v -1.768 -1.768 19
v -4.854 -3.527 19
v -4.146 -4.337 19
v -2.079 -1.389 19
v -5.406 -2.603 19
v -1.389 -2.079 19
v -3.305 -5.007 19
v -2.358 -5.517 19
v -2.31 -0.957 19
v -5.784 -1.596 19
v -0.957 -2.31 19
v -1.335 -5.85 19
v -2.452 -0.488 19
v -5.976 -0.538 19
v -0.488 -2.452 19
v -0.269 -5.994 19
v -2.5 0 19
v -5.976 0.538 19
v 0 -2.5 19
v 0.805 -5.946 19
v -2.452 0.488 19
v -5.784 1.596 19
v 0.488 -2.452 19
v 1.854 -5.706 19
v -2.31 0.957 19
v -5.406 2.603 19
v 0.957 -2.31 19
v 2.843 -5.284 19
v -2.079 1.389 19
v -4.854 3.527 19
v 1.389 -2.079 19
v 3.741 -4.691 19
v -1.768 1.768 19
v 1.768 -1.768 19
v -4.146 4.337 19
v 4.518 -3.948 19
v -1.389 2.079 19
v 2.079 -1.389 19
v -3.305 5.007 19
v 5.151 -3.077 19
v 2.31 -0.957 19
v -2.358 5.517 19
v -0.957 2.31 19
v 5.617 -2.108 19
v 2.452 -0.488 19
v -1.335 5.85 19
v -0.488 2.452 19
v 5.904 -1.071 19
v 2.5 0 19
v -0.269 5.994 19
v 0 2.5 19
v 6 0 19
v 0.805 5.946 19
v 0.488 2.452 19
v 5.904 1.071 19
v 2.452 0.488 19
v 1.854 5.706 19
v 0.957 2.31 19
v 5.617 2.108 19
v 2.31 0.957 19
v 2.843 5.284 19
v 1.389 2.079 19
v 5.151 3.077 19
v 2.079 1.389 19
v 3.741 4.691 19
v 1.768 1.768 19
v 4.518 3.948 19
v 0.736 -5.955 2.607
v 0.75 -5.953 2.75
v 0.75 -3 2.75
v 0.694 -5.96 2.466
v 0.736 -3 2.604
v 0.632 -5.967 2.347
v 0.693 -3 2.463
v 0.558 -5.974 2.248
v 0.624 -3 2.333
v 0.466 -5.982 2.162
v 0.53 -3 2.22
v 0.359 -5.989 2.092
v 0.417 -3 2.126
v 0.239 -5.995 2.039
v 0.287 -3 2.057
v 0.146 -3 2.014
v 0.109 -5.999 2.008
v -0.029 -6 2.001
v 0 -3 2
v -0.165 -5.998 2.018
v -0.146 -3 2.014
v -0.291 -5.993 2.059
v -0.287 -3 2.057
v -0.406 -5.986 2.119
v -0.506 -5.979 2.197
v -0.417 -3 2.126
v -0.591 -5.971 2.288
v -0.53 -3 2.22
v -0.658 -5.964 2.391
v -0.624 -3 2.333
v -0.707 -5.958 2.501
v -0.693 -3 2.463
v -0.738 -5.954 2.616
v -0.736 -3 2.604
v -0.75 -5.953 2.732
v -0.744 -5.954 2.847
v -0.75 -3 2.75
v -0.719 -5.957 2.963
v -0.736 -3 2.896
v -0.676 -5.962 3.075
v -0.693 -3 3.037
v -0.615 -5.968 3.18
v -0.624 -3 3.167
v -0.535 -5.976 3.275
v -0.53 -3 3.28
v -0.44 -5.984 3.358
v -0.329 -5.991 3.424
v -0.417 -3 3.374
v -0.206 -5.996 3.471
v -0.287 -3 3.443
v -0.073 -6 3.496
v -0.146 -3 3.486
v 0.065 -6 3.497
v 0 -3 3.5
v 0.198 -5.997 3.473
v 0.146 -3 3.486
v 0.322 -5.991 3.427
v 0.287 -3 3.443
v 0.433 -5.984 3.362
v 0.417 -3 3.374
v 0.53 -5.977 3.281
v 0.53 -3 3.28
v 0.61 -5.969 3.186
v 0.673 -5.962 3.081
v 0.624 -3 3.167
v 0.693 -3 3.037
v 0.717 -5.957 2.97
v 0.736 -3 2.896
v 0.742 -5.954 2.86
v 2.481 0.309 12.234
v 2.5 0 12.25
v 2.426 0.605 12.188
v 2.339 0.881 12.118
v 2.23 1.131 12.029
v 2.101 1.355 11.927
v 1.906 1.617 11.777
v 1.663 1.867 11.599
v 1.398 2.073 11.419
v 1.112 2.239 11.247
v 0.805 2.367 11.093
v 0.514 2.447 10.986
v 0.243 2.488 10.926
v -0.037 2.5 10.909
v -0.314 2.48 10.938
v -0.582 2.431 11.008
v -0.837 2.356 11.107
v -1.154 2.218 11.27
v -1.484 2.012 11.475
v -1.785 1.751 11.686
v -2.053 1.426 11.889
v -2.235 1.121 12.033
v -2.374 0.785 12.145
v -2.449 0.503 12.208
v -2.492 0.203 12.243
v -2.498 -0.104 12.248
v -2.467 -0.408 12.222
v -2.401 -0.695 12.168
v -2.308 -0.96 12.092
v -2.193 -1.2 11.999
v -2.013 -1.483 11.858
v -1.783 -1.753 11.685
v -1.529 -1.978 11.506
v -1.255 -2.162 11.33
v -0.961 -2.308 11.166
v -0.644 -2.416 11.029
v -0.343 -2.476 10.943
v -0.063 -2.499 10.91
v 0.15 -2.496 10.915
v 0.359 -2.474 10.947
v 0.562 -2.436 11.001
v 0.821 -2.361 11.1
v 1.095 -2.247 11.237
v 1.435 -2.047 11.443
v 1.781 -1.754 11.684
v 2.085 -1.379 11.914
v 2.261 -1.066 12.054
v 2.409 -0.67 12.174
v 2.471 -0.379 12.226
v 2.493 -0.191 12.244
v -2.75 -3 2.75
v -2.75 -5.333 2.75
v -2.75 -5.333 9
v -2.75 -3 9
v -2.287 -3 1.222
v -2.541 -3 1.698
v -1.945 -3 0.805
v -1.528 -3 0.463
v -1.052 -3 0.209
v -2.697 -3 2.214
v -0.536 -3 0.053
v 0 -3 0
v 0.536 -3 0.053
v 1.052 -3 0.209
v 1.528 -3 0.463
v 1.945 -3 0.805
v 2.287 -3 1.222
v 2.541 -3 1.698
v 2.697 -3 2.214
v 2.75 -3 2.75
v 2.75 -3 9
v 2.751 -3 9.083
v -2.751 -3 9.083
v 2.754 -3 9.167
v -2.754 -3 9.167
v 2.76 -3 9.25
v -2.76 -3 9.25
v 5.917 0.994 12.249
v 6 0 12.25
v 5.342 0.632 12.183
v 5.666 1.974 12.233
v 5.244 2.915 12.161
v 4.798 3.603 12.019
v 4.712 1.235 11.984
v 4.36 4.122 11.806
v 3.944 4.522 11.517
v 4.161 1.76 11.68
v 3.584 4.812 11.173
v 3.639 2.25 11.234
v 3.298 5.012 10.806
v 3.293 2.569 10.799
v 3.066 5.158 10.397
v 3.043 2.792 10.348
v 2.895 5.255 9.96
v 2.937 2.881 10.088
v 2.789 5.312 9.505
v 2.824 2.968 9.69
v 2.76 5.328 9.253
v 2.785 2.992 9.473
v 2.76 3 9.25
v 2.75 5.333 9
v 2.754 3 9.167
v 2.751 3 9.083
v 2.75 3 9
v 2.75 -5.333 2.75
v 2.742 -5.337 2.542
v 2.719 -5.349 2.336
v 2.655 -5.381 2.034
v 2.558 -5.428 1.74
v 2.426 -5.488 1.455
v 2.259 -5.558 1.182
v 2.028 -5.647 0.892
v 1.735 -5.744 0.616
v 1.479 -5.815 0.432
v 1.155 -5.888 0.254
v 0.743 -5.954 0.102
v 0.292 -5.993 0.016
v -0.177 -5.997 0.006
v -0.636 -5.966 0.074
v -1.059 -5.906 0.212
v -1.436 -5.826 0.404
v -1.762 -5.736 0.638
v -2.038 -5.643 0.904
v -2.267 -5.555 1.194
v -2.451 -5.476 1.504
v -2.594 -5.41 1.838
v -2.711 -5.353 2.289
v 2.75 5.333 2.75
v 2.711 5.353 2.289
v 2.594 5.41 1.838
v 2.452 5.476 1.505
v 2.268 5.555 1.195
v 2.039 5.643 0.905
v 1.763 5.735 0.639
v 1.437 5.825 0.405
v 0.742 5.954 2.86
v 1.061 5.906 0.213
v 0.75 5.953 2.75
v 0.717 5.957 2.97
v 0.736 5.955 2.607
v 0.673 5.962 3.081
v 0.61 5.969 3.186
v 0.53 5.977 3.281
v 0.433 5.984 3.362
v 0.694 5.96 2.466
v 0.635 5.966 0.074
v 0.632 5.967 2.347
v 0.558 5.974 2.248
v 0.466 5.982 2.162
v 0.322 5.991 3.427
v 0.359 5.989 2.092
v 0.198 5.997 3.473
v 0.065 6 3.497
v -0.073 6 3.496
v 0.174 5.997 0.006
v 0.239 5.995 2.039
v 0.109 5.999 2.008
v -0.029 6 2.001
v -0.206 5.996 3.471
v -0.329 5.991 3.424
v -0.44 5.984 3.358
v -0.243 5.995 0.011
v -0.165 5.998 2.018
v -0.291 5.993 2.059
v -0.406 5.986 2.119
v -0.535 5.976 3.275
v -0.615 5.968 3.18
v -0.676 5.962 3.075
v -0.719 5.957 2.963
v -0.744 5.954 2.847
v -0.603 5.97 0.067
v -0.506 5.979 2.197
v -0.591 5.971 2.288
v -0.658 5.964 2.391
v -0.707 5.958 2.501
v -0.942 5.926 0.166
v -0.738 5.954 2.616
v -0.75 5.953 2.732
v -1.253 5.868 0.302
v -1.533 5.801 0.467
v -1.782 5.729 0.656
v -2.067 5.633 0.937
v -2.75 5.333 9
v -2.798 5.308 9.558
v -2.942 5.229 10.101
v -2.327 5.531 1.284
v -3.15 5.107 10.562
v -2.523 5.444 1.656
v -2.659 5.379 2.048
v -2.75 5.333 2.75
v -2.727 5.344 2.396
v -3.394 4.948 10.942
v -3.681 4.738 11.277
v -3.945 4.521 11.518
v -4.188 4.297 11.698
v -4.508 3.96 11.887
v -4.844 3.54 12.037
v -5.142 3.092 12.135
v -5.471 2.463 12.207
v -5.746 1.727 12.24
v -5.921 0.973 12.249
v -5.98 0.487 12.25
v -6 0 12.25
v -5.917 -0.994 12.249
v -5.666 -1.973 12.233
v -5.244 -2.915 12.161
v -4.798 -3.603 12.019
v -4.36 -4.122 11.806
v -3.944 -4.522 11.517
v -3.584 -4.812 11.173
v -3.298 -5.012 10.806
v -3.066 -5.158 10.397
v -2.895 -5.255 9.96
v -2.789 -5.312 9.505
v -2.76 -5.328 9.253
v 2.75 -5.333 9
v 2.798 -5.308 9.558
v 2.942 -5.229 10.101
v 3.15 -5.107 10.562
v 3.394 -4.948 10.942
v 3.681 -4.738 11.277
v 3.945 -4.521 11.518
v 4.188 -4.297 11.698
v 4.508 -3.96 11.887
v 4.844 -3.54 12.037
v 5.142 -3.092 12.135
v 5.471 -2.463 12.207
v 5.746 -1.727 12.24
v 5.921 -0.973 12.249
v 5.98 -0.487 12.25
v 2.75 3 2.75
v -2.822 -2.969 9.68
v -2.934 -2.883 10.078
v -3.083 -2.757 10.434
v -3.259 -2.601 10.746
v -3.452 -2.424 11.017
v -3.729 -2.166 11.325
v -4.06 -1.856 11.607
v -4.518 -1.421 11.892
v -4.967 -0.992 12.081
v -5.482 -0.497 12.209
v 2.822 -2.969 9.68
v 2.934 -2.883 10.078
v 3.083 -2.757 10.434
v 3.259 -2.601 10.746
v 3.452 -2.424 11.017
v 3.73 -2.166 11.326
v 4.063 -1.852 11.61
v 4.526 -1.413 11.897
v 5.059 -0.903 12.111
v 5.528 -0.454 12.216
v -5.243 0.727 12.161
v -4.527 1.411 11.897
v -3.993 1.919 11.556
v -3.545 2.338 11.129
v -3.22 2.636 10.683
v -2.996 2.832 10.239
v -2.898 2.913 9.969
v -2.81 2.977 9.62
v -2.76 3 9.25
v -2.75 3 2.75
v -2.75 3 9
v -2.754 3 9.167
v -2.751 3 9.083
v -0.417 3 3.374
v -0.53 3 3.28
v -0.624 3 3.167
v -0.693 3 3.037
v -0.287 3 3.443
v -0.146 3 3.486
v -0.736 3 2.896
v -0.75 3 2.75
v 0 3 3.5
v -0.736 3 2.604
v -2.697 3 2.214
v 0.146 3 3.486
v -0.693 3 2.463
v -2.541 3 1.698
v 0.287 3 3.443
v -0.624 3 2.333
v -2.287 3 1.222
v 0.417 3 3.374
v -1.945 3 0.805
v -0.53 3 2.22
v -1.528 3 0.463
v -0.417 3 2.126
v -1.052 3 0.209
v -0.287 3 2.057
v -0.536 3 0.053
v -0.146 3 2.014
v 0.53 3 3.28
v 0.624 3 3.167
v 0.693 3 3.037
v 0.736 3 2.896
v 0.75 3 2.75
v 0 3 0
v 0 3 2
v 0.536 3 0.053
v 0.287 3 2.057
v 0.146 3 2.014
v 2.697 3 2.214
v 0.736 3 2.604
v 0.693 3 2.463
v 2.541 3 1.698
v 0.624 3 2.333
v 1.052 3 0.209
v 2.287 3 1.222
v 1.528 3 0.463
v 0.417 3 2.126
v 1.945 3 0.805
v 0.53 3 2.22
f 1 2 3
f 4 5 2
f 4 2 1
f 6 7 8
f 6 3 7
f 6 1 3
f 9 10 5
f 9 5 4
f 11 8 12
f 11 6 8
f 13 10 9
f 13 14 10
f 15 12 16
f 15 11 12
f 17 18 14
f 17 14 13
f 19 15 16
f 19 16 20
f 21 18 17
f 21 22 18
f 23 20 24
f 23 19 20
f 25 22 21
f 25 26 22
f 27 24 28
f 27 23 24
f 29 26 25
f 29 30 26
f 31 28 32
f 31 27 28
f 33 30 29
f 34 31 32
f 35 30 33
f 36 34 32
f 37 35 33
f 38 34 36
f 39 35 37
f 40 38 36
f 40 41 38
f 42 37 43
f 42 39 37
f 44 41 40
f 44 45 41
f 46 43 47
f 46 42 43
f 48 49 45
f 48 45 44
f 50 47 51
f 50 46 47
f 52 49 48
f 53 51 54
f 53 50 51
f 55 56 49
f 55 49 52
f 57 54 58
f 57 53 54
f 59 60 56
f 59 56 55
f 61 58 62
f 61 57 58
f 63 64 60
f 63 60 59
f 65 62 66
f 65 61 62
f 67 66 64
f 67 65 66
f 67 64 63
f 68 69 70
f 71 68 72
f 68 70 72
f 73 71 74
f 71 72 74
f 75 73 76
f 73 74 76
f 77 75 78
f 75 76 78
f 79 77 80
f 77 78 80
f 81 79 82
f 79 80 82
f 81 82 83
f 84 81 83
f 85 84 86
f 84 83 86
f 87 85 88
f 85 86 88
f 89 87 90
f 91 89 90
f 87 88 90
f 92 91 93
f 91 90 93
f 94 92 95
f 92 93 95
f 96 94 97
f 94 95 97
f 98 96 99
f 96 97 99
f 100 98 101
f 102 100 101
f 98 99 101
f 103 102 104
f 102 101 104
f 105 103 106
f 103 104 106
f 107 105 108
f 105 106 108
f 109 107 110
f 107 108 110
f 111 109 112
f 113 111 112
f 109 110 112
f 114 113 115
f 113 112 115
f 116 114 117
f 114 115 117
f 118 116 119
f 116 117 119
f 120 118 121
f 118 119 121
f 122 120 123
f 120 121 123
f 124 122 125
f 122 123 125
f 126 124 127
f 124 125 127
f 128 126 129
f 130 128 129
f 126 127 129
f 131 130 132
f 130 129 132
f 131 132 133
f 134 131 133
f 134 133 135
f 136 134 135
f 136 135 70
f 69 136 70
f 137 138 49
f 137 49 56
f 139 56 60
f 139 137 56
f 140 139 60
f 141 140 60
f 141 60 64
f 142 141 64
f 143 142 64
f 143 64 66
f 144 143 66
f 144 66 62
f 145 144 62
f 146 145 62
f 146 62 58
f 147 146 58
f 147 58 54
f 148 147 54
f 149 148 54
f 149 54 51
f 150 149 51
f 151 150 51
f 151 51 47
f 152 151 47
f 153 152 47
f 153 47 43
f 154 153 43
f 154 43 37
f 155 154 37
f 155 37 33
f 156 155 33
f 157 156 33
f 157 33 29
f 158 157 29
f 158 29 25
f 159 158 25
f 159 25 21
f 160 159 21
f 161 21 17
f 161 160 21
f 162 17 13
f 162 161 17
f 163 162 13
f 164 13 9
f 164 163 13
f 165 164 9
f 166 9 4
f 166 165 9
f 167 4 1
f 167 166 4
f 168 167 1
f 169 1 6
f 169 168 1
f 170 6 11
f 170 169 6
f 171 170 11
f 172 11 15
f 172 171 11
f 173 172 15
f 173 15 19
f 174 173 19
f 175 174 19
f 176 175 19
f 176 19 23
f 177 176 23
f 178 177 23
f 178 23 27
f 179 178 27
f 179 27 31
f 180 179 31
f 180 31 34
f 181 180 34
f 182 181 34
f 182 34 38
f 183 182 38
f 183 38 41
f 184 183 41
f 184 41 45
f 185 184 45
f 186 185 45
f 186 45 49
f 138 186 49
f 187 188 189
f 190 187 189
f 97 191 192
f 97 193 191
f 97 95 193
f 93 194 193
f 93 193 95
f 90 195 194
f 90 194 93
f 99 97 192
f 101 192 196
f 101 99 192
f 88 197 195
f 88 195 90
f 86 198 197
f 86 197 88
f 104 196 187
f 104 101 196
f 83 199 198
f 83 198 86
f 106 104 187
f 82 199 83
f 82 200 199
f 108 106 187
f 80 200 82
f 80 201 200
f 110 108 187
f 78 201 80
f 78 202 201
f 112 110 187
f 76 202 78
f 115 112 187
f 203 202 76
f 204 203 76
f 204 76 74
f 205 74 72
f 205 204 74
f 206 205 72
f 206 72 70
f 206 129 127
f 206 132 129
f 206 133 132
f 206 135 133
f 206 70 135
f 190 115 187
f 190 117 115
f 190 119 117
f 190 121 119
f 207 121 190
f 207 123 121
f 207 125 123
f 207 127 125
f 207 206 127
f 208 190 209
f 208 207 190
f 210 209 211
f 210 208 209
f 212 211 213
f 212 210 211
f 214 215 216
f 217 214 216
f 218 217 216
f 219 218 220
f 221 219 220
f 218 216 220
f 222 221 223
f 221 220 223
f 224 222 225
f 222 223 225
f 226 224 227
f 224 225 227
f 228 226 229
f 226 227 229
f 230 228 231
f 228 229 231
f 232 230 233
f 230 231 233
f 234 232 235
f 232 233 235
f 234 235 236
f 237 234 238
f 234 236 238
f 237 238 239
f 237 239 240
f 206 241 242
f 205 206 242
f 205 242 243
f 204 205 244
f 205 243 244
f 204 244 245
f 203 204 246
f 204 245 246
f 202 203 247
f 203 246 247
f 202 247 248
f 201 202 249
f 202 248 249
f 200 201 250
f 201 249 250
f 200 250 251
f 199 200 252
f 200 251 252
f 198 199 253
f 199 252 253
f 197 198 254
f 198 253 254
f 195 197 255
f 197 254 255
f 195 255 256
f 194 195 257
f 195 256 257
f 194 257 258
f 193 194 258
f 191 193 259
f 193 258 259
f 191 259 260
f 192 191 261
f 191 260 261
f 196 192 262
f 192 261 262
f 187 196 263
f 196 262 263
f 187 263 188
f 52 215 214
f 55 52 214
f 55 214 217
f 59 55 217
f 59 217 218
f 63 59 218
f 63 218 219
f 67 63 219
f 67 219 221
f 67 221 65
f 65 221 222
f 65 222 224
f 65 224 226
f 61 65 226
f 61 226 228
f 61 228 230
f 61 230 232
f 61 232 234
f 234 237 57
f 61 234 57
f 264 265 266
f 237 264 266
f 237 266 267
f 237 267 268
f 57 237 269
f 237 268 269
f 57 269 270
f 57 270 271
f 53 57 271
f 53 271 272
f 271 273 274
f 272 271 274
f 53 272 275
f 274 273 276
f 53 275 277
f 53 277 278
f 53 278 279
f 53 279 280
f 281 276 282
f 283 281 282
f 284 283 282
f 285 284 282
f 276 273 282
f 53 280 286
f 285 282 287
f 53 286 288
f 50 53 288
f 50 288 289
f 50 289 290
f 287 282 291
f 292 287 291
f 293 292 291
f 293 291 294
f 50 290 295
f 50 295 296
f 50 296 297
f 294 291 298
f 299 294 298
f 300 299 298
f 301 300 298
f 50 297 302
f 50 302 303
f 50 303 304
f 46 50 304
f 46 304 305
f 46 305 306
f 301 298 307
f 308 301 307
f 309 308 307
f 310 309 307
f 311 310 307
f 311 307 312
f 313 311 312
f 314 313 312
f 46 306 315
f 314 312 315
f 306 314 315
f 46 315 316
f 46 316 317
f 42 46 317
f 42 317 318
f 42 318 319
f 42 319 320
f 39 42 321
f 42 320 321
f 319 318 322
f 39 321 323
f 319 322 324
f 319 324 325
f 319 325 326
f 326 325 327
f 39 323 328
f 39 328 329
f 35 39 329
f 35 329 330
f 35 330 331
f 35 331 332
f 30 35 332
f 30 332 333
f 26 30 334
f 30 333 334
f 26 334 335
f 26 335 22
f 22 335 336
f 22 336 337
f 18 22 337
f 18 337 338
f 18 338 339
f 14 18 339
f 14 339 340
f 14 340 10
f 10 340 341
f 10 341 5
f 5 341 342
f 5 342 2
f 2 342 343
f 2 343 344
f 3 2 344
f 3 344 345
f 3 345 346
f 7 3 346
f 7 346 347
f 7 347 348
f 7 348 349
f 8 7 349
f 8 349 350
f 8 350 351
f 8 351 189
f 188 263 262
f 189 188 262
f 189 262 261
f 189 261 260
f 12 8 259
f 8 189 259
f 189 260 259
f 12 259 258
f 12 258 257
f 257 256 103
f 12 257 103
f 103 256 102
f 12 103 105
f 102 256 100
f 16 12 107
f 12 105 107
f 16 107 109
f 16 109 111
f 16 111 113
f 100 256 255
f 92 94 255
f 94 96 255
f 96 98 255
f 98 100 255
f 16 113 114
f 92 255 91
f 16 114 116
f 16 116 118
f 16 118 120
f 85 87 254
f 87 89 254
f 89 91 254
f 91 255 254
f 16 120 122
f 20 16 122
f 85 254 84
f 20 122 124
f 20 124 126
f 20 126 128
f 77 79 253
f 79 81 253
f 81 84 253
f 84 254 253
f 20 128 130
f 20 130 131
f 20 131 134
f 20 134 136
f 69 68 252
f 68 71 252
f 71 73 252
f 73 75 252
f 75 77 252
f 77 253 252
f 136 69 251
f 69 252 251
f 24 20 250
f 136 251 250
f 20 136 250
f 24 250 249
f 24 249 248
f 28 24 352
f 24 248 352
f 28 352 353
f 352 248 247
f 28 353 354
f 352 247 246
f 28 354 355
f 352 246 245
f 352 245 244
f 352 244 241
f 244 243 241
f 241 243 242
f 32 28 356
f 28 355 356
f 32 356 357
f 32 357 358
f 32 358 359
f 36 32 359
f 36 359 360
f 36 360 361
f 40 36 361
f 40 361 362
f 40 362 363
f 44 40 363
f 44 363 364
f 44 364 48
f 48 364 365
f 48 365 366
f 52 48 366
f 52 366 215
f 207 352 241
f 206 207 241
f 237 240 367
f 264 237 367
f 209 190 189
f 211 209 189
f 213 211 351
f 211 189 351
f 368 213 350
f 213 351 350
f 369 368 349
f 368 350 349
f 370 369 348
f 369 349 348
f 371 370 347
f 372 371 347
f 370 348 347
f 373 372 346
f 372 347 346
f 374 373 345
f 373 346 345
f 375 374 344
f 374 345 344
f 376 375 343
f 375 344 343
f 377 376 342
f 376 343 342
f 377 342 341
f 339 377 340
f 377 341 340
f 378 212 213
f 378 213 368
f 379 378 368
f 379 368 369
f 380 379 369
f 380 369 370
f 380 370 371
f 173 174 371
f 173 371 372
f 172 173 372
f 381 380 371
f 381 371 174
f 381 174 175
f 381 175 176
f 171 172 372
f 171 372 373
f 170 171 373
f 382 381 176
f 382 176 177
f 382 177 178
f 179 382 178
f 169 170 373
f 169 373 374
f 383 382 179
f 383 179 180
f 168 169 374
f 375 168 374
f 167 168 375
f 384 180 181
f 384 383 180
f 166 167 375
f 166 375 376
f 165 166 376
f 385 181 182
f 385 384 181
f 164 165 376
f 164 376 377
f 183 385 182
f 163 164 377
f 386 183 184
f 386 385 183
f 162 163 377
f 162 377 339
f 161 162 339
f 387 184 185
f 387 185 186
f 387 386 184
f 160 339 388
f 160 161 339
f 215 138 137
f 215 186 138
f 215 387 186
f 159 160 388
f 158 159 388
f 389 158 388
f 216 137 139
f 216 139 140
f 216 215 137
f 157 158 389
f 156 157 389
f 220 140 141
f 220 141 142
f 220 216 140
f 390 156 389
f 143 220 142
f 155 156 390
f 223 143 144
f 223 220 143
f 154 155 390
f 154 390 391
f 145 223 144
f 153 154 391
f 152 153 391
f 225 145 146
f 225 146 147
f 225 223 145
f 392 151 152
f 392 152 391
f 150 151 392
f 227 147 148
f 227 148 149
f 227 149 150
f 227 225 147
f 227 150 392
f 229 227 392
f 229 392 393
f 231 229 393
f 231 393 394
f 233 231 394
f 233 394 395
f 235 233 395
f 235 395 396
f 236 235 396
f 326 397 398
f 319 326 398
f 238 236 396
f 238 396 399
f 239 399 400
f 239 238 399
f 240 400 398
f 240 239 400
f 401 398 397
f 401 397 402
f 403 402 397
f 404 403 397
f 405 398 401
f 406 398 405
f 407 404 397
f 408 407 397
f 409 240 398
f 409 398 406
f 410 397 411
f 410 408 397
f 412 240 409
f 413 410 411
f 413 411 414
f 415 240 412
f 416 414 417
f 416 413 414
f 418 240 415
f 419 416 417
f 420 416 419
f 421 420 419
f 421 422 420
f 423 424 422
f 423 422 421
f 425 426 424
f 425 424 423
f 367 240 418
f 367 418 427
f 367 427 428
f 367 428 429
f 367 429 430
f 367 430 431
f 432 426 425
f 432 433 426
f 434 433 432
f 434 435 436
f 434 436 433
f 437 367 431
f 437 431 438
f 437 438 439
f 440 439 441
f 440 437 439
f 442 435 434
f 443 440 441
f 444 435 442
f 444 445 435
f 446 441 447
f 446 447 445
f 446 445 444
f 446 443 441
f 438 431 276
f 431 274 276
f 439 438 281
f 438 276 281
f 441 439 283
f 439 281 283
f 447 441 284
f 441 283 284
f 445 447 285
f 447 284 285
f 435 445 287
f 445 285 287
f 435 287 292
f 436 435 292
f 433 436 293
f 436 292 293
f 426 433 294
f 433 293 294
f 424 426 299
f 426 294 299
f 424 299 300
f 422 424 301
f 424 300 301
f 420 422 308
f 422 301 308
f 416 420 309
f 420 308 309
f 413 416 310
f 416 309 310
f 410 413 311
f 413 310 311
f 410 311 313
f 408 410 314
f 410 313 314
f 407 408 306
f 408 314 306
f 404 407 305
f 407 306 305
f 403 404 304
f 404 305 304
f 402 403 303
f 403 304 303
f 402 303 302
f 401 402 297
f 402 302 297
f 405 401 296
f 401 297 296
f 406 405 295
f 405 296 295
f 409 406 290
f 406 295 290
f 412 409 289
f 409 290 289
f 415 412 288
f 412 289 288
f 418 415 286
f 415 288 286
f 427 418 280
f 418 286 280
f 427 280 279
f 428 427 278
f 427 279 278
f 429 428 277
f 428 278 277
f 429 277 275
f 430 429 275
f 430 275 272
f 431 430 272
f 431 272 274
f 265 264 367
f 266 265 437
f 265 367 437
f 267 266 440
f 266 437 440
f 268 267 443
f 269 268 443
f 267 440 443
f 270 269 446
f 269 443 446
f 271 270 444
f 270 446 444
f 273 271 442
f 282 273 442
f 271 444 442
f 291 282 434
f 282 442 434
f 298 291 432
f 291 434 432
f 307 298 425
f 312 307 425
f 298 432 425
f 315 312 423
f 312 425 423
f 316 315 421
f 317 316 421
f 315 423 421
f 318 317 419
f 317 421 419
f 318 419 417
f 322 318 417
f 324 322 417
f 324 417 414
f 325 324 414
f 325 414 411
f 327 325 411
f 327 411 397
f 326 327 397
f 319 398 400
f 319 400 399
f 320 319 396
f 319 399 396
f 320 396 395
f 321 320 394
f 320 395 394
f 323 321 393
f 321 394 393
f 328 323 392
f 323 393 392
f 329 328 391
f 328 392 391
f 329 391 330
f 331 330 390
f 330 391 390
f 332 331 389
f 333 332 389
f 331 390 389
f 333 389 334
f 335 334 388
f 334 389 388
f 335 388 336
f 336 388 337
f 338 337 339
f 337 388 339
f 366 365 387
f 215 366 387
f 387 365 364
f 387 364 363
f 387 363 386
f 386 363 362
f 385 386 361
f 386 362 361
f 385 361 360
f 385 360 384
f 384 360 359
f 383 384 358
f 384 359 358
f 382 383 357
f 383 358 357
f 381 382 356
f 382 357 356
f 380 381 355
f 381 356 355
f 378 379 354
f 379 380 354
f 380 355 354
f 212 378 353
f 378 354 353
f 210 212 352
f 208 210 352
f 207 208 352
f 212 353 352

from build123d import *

# Parameters (mm, degrees)
SKETCH_1_R          = 6
SKETCH_1_R_2        = 2.5
EXTRUDE_1_DEPTH     = 19
SKETCH_2_OUTSIDE_W  = 19.096
SKETCH_2_OUTSIDE_H  = 26.096
SKETCH_2_OUTSIDE_R  = 0.75
CUT_EXTRUDE_1_DEPTH = 9.5
CUT_EXTRUDE_2_DEPTH = 9.5


with BuildPart() as part:
    # 草图1 → 凸台-拉伸1 (new body)
    with BuildSketch(Plane.XY):
        Circle(SKETCH_1_R)
        Circle(SKETCH_1_R_2, mode=Mode.SUBTRACT)
    extrude(amount=EXTRUDE_1_DEPTH)

    # 草图2 outside → 切除-拉伸1 (cut, symmetric)
    with BuildSketch(Plane(origin=(0, 0, 0), x_dir=(1, 0, 0), z_dir=(0, 1, 0))):
        with Locations((0, -9.5)):
            Rectangle(SKETCH_2_OUTSIDE_W, SKETCH_2_OUTSIDE_H)
        with BuildLine():
            Line((-2.75, -2.75), (-2.75, -9))
            ThreePointArc((-2.75, -9), (-3.701902961, -11.298097039), (-6, -12.25))
            Line((-6, -12.25), (-6, -19))
            Line((-6, -19), (6, -19))
            Line((6, -19), (6, -12.25))
            ThreePointArc((6, -12.25), (3.701902961, -11.298097039), (2.75, -9))
            Line((2.75, -9), (2.75, -2.75))
            ThreePointArc((2.75, -2.75), (0, 0), (-2.75, -2.75))
        make_face(mode=Mode.SUBTRACT)
        with Locations((0, -2.75)):
            Circle(SKETCH_2_OUTSIDE_R)
    extrude(amount=CUT_EXTRUDE_1_DEPTH, both=True, mode=Mode.SUBTRACT)

    # 草图3 → 切除-拉伸2 (cut, symmetric)
    with BuildSketch(Plane(origin=(0, 0, 0), x_dir=(0, 0, -1), z_dir=(1, 0, 0))):
        with BuildLine():
            Line((-9.250000001, 3), (0, 3))
            Line((0, 3), (0, -3))
            Line((0, -3), (-9.250000001, -3))
            ThreePointArc((-9.250000001, -3), (-12.250000001, 0), (-9.250000001, 3))
        make_face()
    extrude(amount=CUT_EXTRUDE_2_DEPTH, both=True, mode=Mode.SUBTRACT)


solid = part.part
